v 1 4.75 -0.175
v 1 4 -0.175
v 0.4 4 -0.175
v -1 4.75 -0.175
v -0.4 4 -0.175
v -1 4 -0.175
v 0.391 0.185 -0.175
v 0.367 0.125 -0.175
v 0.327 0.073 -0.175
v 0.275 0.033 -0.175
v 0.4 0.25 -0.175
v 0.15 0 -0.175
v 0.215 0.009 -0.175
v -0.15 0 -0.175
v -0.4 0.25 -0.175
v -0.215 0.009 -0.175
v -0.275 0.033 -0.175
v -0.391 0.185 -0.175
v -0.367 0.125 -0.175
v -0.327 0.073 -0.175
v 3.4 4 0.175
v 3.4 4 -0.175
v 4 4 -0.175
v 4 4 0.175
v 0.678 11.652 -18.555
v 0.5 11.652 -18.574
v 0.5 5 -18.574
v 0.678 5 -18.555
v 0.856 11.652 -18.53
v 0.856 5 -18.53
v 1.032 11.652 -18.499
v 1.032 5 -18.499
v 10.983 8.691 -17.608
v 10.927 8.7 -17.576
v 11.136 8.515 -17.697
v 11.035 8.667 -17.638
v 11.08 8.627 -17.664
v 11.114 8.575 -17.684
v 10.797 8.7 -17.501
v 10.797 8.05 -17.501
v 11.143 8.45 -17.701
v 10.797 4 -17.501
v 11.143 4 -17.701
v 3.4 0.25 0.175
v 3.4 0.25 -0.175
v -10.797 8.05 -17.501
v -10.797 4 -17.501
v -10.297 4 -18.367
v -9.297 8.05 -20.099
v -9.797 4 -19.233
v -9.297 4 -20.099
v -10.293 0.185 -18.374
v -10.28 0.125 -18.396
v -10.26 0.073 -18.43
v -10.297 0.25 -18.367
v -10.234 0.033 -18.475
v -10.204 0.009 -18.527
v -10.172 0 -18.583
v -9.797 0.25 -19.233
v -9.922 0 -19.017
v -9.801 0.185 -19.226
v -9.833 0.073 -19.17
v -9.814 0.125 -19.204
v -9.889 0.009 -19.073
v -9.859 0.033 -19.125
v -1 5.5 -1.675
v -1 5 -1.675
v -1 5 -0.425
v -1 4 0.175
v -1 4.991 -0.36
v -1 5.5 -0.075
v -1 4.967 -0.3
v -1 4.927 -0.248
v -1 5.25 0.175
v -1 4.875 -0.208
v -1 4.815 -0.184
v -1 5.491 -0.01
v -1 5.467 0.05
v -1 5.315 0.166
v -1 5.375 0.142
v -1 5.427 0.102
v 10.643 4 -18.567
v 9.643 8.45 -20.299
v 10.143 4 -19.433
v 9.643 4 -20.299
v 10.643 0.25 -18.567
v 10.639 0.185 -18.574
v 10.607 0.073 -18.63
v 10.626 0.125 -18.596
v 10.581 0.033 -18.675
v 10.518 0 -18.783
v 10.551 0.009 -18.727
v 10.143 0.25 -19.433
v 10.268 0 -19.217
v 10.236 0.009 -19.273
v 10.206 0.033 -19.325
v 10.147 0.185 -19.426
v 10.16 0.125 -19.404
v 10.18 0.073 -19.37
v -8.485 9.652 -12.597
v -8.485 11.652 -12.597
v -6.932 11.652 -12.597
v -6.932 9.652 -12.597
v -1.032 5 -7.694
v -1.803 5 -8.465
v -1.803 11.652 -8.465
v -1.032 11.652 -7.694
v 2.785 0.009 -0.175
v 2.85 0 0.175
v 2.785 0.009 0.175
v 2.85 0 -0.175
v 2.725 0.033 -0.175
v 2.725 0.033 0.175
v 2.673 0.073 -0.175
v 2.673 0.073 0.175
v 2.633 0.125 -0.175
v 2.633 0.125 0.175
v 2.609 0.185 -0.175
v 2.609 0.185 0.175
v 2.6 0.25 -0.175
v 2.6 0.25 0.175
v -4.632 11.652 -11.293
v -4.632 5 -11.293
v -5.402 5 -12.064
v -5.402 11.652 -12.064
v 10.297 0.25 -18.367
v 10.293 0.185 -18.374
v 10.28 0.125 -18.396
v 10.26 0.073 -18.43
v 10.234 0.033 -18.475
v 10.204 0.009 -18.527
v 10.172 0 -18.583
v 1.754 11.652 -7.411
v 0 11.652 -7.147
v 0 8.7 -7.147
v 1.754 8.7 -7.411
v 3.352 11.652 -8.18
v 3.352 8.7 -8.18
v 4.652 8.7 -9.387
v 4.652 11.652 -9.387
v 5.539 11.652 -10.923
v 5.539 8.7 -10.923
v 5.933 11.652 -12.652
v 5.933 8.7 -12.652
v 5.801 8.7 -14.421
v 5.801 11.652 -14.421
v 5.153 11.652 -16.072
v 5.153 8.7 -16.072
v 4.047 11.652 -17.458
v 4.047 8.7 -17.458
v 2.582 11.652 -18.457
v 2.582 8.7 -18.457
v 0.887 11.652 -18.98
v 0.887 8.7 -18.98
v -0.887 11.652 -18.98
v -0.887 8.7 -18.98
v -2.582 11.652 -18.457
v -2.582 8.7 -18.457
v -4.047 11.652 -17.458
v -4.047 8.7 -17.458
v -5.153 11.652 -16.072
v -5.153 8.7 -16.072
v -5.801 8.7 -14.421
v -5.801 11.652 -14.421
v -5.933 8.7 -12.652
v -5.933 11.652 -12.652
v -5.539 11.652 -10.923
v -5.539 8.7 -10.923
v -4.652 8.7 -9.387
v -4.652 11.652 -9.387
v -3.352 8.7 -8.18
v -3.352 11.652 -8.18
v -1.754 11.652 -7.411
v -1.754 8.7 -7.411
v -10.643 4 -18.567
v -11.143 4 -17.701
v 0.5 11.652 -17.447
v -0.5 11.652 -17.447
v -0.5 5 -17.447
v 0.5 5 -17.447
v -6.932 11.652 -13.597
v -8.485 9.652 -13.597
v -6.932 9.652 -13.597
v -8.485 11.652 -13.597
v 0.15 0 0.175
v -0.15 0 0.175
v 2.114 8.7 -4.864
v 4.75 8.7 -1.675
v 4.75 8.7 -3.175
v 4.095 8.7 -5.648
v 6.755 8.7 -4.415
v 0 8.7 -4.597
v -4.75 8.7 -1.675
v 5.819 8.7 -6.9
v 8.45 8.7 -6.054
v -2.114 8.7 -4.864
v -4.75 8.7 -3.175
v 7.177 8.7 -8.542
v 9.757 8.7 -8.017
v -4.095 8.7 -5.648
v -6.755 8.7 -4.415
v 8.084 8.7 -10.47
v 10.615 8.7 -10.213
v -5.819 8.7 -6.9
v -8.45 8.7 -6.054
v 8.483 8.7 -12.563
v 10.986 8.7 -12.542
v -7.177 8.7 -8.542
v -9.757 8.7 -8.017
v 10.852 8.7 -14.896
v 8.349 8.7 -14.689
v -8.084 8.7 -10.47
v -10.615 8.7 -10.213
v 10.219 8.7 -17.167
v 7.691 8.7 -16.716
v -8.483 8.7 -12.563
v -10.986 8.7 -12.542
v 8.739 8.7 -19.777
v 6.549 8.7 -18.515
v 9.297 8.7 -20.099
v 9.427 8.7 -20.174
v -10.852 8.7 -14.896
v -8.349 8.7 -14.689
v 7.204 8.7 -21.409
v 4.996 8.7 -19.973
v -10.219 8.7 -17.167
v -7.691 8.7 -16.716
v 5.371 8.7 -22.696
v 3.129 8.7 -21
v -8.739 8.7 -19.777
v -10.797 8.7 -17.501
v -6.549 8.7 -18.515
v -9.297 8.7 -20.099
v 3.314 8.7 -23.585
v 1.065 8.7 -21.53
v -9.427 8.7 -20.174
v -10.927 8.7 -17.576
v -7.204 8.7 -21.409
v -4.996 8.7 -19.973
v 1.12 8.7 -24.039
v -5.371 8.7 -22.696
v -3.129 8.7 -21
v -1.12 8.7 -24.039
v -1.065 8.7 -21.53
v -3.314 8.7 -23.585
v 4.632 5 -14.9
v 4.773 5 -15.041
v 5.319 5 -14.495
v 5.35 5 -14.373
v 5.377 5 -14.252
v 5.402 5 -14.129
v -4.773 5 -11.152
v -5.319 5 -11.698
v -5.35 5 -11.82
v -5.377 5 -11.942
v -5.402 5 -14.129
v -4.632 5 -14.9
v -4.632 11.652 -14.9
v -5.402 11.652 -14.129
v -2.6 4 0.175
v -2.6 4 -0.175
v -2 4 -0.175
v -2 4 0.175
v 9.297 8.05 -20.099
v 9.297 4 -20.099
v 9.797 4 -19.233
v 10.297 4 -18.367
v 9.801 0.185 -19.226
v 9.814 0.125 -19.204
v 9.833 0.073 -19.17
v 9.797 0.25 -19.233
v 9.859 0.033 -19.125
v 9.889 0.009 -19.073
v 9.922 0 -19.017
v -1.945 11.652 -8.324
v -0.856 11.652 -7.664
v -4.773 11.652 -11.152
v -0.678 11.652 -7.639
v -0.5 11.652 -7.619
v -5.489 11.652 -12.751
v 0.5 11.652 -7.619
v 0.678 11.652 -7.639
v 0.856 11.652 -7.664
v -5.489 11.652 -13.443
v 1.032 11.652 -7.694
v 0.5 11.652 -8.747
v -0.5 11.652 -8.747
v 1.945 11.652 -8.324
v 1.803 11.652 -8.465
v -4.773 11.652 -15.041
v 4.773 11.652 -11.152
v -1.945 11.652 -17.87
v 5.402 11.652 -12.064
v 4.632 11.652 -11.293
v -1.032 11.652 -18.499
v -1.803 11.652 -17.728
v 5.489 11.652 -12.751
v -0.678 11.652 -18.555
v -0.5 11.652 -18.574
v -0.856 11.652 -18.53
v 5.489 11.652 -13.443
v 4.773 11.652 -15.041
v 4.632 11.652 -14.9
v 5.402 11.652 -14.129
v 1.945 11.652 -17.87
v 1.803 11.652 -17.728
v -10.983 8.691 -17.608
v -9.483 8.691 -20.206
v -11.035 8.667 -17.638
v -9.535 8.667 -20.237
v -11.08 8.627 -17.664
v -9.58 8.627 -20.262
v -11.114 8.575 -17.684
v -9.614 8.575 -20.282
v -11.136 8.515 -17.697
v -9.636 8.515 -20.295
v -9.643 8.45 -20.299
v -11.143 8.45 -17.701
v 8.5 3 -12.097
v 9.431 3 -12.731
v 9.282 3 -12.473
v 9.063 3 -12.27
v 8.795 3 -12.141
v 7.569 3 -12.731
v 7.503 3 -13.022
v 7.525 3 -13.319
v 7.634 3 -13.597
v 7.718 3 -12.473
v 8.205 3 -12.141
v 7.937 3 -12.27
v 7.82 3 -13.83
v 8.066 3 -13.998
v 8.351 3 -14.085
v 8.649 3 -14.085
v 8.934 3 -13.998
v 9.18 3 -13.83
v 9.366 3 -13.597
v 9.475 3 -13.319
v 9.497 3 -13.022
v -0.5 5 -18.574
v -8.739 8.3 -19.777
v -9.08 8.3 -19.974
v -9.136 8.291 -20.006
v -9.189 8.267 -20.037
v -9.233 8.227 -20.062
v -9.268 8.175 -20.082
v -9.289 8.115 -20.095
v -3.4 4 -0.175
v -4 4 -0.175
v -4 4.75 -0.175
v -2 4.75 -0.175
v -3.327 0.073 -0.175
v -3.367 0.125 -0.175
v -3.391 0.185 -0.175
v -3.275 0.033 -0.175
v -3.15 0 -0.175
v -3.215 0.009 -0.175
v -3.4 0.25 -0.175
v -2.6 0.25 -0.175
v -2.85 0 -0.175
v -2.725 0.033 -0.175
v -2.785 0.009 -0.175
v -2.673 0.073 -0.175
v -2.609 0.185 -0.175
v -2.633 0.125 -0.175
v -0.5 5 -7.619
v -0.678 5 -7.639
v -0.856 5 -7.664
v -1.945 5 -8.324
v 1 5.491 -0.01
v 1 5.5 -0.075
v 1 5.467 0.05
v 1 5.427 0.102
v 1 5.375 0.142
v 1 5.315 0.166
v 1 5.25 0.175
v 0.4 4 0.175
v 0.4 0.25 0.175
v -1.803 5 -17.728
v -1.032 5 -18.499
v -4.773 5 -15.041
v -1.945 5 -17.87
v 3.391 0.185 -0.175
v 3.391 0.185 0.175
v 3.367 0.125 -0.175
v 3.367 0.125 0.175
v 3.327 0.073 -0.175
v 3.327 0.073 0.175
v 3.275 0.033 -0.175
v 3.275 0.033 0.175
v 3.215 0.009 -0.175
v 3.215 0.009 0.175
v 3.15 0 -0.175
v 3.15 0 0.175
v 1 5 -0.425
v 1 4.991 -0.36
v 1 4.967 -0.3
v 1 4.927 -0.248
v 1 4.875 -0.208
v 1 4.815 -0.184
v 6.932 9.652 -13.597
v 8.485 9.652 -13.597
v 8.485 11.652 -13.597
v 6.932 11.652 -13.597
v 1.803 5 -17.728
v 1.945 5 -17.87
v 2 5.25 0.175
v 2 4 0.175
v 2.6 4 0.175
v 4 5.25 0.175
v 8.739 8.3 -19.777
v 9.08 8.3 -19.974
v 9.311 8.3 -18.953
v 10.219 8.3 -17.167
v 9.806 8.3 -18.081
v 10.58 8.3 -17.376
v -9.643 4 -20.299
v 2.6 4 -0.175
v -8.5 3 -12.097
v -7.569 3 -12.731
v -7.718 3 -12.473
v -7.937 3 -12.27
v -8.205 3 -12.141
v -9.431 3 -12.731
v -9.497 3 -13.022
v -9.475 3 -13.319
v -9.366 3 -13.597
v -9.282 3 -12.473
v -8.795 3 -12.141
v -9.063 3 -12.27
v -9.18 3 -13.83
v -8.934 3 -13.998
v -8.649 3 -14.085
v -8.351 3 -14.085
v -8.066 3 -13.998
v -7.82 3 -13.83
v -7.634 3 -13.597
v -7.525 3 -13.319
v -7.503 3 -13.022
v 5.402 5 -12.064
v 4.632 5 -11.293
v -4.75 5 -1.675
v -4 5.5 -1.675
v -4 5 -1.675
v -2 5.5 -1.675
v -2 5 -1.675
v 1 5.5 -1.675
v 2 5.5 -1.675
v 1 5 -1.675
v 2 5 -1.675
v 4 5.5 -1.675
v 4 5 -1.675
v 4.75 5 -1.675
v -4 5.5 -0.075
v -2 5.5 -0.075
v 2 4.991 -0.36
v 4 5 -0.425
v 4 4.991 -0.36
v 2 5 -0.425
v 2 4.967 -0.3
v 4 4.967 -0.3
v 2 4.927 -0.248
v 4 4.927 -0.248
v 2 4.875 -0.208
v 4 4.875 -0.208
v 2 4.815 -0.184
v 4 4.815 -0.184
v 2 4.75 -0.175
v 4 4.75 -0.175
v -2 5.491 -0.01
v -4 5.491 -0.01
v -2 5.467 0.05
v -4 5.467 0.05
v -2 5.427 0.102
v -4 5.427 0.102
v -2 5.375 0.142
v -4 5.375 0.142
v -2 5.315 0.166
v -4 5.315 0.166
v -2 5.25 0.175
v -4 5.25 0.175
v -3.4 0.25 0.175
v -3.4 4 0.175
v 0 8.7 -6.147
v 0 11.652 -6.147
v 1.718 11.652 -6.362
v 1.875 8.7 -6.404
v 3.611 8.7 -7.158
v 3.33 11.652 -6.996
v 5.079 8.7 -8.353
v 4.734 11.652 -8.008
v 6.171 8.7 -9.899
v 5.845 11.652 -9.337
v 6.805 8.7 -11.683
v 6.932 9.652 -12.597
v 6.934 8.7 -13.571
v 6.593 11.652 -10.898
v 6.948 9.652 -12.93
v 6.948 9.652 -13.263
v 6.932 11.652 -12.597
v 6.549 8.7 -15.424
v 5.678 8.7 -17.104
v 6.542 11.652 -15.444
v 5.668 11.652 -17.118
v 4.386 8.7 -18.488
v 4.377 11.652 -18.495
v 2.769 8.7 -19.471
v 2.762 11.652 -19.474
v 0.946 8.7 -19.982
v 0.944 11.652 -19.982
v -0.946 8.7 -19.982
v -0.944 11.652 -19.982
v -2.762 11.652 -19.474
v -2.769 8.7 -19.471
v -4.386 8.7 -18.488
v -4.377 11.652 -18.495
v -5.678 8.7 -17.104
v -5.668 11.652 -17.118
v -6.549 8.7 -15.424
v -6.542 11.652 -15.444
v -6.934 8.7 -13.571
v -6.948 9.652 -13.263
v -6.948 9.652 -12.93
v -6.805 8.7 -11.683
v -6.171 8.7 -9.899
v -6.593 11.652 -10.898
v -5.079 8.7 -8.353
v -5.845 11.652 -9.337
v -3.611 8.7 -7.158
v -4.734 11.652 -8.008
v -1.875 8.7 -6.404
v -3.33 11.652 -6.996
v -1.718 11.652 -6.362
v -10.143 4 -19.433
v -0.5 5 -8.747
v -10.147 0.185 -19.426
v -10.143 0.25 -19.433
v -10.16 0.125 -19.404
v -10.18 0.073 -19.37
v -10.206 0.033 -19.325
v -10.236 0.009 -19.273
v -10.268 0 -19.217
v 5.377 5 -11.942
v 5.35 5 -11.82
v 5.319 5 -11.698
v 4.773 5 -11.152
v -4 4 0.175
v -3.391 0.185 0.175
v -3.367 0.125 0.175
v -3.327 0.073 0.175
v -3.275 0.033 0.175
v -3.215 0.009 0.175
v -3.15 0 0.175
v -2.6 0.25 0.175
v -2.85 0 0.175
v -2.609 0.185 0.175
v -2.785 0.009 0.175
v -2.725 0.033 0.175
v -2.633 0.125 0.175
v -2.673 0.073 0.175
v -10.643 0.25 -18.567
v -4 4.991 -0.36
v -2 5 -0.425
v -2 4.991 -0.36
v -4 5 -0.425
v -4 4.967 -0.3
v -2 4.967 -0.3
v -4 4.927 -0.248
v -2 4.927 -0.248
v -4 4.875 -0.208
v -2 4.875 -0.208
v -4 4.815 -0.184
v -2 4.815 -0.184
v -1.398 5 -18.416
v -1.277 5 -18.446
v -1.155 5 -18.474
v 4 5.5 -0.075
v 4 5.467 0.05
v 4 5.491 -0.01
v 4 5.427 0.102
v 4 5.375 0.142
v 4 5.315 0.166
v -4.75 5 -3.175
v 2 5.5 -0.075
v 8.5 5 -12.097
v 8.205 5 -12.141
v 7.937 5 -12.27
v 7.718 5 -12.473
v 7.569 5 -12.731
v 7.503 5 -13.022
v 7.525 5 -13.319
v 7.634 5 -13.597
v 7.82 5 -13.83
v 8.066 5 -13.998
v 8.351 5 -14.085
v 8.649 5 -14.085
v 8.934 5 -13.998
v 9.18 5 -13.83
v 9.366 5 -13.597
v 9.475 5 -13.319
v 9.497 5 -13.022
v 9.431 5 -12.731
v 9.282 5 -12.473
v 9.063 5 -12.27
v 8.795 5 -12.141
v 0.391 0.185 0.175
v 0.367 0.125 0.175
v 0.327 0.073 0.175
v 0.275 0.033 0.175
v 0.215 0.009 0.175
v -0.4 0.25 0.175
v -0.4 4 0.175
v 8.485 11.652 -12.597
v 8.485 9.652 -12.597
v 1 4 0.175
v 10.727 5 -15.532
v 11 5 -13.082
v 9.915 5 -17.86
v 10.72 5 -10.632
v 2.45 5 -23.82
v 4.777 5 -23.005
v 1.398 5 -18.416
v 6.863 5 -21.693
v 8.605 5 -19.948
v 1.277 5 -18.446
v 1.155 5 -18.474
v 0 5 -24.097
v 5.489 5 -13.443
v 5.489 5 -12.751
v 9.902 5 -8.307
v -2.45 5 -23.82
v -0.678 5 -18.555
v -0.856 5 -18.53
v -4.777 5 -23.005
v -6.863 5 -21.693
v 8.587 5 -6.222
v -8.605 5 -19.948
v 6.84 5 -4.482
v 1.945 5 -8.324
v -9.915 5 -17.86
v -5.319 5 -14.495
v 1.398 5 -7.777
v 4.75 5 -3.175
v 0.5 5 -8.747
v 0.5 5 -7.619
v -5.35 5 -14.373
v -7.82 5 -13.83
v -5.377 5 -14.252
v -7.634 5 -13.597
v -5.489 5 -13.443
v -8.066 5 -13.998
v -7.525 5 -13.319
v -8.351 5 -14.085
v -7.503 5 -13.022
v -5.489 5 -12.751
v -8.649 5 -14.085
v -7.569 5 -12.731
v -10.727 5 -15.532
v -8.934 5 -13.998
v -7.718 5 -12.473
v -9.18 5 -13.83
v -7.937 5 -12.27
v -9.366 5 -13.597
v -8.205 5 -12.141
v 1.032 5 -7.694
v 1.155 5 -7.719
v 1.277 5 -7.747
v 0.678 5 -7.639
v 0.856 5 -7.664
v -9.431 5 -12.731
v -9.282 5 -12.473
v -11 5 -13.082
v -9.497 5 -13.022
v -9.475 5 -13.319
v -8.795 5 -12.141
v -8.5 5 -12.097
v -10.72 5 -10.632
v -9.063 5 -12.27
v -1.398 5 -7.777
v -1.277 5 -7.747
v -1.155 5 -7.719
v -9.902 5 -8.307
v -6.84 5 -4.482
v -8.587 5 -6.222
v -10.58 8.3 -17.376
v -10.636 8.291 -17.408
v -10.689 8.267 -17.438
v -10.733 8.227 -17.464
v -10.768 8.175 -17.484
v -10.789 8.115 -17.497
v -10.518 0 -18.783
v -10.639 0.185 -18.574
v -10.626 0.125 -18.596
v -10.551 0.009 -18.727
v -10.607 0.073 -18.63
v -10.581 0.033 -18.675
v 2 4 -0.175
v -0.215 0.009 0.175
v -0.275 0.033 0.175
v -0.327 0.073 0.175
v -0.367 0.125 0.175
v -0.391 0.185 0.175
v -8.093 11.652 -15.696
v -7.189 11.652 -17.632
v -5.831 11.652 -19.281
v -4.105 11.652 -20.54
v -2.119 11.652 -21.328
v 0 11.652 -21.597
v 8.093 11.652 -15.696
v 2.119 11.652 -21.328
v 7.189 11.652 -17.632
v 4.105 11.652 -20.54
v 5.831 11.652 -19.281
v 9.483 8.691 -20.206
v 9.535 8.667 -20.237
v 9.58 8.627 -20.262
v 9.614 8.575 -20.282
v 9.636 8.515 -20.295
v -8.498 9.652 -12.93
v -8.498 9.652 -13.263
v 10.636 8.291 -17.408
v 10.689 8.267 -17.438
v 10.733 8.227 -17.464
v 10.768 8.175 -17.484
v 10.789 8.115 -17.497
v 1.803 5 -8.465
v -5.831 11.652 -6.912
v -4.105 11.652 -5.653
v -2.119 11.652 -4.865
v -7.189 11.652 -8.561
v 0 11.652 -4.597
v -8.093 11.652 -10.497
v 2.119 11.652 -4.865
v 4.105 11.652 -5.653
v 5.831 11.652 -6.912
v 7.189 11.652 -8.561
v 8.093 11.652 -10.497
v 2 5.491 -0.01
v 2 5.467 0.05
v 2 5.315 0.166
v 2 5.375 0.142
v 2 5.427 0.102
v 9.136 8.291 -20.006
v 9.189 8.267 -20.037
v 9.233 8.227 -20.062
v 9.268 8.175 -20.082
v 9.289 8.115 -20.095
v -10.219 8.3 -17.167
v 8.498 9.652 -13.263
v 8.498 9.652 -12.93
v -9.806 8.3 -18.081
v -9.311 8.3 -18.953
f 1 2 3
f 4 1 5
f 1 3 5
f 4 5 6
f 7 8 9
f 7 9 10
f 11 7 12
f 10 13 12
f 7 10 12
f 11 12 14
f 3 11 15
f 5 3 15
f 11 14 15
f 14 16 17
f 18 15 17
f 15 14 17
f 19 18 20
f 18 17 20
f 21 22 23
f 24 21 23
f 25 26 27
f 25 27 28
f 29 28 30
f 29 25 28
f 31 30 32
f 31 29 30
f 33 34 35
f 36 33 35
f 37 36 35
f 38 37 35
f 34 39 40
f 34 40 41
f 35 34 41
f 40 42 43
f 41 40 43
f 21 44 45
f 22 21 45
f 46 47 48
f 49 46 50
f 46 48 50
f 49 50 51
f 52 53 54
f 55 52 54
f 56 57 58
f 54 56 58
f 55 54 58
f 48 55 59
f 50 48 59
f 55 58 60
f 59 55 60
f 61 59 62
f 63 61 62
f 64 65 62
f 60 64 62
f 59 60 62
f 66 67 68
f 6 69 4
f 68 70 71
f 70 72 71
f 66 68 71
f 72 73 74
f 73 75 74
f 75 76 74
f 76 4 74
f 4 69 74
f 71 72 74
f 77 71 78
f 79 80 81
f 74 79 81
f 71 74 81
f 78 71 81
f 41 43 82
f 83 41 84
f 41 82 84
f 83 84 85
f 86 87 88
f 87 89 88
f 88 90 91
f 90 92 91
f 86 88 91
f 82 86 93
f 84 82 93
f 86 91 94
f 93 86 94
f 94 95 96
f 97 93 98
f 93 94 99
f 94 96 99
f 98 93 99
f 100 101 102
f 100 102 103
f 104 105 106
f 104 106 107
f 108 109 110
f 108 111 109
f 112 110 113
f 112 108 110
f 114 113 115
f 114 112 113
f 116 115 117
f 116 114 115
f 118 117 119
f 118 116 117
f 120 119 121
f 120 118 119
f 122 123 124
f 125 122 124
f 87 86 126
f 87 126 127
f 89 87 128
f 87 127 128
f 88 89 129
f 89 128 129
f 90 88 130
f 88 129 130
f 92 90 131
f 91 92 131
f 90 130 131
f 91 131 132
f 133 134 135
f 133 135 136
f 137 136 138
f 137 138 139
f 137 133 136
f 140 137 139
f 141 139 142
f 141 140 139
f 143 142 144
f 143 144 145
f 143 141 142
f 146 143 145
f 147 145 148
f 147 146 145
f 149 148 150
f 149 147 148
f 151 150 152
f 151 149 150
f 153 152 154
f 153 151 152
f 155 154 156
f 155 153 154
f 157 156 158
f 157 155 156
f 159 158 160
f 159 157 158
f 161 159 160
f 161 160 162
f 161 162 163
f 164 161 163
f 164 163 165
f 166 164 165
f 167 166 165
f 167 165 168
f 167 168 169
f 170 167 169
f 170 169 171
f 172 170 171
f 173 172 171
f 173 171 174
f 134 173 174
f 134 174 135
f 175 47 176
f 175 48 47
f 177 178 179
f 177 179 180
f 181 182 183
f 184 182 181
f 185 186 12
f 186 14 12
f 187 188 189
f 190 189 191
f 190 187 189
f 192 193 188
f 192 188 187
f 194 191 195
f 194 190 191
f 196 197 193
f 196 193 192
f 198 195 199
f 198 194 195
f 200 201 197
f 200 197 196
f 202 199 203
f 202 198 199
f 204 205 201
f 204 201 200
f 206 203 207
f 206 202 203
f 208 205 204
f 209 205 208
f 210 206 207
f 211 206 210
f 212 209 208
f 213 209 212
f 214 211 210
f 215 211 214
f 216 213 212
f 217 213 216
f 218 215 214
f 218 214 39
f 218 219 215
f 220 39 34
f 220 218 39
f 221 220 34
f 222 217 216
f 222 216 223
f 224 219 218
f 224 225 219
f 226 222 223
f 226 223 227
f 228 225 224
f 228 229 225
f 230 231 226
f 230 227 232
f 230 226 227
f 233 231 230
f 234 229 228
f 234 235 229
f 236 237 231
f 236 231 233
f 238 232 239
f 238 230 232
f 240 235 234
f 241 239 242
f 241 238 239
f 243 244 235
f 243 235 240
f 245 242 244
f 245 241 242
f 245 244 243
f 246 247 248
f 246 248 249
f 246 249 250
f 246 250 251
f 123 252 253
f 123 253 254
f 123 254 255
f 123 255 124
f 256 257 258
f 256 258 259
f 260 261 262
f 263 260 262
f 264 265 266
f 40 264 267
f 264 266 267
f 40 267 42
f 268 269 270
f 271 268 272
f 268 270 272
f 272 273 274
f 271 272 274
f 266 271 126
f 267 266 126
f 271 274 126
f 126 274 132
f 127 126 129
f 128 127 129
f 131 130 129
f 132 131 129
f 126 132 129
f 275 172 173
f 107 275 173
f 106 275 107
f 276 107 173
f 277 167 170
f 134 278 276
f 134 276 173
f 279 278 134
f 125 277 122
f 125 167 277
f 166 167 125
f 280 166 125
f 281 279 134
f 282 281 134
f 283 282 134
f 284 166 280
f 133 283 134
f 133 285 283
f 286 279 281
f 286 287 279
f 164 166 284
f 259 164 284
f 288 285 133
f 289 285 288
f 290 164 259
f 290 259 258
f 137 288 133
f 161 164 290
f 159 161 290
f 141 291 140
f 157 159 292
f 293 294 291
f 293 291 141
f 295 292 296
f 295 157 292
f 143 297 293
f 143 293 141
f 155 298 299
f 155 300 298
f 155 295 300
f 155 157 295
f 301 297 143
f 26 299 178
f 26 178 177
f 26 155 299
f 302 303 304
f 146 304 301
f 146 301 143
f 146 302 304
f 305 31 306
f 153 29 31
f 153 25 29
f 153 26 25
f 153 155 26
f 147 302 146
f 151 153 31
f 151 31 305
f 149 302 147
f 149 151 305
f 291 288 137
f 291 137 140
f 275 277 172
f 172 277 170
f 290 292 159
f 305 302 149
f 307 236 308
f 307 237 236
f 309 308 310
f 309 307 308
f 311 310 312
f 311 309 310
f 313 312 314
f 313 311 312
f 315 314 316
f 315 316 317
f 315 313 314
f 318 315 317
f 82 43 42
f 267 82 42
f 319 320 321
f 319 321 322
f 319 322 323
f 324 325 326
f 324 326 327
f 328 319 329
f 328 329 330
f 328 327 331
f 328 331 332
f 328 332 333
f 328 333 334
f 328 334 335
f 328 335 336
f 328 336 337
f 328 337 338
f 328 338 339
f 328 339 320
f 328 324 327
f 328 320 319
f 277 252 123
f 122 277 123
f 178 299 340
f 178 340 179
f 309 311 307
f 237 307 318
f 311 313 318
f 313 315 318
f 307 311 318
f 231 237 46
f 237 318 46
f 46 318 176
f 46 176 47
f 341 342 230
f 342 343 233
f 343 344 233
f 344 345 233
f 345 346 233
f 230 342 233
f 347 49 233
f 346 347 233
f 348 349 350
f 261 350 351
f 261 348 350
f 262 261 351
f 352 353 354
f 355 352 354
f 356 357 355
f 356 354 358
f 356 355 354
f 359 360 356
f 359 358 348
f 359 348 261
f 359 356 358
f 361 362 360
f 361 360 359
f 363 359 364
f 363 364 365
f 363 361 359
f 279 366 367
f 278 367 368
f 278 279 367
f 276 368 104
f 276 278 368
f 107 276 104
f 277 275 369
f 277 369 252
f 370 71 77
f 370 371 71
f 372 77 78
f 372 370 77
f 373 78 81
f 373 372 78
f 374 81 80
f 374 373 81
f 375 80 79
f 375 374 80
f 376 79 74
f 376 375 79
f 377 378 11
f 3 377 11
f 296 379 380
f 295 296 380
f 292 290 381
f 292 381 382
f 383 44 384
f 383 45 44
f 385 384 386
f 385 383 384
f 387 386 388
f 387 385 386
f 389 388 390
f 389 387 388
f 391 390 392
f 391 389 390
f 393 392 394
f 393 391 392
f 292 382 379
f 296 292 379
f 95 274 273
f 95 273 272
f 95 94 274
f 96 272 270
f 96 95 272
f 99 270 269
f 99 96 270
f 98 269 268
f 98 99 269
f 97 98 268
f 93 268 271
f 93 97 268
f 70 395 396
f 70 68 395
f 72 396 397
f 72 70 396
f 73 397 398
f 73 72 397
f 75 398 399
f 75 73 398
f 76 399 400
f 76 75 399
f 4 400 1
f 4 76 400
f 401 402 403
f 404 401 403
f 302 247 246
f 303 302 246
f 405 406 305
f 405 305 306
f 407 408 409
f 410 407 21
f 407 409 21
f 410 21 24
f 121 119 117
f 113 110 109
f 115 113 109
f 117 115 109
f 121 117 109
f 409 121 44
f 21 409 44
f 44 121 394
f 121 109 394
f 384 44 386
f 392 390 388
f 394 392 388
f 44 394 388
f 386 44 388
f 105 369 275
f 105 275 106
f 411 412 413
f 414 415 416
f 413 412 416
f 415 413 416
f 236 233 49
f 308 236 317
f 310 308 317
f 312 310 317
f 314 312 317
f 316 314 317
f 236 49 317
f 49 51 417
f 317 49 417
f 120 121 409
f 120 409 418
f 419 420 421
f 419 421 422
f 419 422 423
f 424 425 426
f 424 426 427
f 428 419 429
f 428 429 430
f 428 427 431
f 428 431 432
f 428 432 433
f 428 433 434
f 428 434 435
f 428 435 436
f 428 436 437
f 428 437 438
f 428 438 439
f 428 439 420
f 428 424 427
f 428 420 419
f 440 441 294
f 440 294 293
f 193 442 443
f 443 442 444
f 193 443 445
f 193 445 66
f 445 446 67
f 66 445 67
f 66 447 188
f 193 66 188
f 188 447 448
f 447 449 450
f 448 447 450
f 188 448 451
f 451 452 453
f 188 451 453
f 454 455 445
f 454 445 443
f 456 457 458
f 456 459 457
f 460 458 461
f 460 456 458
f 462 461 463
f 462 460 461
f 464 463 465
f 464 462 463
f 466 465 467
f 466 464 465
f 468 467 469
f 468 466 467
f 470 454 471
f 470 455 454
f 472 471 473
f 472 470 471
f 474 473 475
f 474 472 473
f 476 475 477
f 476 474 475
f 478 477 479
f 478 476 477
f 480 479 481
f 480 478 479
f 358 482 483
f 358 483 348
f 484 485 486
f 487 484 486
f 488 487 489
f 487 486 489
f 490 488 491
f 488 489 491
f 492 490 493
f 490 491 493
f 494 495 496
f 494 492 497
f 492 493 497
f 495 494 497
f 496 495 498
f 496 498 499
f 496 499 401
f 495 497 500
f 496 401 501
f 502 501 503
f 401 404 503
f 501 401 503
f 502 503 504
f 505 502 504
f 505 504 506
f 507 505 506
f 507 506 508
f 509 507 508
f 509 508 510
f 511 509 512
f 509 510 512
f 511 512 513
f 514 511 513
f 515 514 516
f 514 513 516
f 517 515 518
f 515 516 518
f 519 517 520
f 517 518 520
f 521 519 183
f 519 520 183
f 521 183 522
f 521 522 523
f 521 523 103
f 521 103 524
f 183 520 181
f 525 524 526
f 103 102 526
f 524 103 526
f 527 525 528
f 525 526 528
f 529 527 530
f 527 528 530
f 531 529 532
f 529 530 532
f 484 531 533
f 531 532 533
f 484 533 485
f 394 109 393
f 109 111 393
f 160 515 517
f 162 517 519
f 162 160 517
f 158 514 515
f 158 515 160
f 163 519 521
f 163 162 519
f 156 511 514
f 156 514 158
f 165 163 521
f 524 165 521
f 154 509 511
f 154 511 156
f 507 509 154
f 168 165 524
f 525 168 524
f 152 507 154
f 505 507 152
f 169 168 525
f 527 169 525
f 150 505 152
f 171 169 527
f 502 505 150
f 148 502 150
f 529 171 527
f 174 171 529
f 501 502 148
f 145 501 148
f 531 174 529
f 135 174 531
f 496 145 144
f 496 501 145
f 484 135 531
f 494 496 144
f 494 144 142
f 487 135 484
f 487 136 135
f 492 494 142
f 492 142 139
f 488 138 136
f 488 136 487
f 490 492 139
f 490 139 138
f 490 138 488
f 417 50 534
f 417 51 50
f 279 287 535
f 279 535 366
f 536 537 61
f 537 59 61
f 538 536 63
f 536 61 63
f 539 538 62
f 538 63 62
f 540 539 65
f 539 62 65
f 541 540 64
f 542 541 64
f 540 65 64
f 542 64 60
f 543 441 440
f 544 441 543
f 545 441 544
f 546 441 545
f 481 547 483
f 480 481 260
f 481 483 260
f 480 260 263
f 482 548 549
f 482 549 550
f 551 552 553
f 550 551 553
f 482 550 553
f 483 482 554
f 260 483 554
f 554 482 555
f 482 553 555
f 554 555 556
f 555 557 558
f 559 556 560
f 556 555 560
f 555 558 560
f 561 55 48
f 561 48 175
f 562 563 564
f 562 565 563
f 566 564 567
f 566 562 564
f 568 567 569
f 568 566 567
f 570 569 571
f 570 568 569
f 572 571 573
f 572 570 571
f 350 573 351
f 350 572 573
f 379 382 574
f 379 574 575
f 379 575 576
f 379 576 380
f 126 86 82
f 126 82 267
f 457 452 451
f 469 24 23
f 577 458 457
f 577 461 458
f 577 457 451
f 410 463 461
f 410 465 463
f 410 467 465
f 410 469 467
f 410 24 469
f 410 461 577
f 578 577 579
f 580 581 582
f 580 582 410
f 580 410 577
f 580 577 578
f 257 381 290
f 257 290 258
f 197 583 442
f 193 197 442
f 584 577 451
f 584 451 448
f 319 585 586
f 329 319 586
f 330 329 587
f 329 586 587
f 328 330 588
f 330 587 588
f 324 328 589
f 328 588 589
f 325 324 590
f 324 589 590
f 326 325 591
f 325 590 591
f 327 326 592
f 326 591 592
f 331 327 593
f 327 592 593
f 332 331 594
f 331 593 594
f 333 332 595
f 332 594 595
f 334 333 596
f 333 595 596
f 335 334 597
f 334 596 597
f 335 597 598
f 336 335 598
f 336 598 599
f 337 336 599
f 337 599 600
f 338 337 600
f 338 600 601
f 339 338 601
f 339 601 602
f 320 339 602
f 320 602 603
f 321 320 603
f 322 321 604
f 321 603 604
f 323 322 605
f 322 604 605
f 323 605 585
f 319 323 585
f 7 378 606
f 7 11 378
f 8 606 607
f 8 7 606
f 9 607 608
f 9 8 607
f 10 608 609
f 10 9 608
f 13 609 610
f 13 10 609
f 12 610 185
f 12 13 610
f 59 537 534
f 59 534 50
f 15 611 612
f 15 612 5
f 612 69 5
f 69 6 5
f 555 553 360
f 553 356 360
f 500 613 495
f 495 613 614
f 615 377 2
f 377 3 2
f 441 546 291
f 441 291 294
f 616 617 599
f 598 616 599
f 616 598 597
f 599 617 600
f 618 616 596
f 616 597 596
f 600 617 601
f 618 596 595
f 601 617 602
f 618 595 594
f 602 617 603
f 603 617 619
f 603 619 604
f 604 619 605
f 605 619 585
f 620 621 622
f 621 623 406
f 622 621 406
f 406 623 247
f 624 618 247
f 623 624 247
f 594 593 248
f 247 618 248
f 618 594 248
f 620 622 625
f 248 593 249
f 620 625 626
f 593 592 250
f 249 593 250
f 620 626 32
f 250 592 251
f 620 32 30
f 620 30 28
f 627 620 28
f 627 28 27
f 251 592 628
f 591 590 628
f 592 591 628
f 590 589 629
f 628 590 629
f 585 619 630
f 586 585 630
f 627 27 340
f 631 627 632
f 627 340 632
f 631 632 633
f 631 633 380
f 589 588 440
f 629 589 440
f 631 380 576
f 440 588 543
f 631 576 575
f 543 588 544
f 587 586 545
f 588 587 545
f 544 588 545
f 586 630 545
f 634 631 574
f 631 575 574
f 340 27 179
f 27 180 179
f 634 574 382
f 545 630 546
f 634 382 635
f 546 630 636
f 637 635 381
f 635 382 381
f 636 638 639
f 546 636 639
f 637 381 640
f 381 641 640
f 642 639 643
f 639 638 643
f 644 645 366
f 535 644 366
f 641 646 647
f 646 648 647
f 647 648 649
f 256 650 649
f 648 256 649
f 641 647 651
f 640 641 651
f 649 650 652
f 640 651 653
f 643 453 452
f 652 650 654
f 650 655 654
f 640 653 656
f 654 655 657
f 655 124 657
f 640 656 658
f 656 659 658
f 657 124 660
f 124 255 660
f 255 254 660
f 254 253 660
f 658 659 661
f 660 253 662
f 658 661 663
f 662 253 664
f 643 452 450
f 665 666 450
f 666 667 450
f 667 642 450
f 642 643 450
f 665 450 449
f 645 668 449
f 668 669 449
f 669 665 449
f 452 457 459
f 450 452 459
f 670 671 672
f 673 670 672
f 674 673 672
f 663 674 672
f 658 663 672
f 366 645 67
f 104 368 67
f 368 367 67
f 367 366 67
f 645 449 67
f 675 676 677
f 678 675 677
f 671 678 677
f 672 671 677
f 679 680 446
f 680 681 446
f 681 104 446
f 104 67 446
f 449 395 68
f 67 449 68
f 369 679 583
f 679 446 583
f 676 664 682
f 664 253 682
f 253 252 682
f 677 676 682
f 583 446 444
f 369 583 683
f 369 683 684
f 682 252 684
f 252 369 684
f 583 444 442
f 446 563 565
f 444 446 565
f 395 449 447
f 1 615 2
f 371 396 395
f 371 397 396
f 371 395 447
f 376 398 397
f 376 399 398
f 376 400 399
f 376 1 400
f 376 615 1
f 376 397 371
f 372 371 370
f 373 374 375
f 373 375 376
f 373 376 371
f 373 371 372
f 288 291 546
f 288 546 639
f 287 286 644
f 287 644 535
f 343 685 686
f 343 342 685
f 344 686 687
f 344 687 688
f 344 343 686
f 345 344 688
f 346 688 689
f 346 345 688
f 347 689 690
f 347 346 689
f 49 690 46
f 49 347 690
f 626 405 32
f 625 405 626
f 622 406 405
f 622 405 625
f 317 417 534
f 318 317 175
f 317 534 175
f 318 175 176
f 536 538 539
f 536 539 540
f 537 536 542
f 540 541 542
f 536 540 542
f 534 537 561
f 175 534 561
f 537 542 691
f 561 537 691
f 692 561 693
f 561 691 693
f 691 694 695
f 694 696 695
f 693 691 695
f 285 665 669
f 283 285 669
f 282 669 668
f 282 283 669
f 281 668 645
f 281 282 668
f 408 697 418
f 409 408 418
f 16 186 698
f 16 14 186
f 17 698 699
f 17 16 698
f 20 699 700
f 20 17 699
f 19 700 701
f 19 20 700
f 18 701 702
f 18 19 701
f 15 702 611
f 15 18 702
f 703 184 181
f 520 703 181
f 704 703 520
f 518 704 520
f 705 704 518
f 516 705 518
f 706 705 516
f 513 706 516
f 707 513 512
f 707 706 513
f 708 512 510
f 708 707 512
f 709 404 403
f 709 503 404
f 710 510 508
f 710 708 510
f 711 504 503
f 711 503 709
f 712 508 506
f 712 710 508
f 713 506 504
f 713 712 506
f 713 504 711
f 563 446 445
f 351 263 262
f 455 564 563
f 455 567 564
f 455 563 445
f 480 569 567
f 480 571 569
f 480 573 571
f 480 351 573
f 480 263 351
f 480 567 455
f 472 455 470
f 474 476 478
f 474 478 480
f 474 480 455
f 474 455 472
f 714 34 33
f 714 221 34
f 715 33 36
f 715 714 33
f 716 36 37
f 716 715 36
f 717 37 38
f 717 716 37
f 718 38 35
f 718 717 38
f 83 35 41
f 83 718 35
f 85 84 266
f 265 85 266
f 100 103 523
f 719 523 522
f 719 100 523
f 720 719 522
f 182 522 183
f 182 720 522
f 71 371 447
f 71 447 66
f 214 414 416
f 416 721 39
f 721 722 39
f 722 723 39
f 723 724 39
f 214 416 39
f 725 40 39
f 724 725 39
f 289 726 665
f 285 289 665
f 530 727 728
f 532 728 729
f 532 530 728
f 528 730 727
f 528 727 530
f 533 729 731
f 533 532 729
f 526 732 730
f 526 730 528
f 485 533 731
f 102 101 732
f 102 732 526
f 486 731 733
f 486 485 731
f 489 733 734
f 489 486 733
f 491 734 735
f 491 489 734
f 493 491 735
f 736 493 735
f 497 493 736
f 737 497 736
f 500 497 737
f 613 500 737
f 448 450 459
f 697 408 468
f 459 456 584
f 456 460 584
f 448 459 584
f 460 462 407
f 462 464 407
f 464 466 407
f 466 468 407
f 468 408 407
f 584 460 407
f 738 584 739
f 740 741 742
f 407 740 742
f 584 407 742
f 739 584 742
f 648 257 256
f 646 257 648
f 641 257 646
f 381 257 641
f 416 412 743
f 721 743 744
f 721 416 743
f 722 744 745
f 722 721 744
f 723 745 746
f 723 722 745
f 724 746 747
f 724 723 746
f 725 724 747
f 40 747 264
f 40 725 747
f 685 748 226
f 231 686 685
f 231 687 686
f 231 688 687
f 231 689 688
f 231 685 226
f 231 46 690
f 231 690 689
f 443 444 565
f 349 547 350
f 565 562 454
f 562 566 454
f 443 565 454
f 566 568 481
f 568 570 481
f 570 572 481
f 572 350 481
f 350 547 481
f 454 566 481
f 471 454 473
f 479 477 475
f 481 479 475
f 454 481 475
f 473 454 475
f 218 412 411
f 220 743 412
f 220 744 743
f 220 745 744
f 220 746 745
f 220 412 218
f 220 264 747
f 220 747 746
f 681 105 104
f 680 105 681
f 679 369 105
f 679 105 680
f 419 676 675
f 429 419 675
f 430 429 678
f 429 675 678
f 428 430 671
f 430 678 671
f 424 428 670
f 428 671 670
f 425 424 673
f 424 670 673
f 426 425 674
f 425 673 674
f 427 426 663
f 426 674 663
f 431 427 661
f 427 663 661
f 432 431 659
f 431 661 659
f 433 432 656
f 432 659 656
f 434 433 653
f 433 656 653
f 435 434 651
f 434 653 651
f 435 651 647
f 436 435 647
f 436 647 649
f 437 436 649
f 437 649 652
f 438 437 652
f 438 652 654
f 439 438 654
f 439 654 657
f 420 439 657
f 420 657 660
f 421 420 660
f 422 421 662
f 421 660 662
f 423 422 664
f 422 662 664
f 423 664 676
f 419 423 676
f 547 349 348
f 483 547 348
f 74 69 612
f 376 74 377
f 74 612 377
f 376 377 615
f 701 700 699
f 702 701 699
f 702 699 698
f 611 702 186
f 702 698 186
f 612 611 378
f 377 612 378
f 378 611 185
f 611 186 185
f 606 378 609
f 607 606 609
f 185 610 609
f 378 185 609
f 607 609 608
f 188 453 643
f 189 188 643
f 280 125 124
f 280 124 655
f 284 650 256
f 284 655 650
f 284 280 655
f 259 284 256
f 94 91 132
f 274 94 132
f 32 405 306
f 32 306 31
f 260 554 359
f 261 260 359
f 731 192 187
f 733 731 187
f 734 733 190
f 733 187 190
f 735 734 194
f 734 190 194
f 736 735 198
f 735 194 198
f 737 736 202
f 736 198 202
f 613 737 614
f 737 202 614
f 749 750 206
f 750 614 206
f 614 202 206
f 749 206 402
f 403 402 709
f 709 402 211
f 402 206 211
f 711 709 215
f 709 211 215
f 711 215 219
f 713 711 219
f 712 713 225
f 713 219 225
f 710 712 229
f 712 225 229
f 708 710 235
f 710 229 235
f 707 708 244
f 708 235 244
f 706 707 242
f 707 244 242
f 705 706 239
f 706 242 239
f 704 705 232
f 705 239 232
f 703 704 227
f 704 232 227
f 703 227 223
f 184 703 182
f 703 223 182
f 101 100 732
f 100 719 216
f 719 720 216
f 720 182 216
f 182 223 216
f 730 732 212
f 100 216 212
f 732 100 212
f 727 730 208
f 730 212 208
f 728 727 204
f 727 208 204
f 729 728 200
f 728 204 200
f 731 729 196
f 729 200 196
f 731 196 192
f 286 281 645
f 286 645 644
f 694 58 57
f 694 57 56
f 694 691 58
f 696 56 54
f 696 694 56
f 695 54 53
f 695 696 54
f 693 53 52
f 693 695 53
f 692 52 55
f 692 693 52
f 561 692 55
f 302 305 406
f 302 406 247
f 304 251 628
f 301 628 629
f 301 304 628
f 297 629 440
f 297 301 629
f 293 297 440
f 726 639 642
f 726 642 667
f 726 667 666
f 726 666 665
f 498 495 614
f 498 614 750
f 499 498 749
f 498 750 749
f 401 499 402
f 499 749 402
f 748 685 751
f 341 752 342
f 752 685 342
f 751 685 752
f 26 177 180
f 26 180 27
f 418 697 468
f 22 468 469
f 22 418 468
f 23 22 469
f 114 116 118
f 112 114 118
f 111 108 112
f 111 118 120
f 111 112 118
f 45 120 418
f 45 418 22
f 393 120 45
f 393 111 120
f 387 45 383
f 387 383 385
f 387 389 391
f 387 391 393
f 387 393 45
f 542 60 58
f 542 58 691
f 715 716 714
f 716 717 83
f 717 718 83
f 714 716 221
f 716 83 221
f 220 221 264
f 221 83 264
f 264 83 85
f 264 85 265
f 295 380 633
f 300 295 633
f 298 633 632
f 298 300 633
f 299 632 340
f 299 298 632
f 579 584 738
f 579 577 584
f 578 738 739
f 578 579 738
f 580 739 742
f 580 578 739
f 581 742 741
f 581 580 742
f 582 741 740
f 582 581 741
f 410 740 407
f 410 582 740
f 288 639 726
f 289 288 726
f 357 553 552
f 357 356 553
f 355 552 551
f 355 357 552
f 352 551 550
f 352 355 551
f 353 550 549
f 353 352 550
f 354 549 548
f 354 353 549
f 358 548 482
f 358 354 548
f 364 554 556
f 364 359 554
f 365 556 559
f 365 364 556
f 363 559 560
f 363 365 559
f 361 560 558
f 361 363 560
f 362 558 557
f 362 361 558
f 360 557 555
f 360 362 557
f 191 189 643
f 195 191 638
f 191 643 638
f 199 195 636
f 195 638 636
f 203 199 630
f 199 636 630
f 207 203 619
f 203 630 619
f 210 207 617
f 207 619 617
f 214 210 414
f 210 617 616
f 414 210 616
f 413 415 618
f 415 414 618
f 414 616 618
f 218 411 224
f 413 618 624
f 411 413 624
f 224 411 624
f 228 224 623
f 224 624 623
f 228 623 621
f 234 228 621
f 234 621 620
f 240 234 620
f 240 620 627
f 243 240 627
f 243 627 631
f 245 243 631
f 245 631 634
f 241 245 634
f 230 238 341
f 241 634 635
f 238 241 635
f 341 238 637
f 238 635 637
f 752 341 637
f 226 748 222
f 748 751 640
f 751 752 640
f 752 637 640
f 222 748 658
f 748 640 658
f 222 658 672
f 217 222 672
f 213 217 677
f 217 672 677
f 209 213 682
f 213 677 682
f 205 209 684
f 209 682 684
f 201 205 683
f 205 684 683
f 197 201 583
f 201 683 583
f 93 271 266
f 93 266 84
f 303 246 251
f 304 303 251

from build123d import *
from build123d.topology import SkipClean

# Parameters (mm, degrees)
BOSS_EXTRUDE1_DEPTH      = 4
SKETCH1_W                = 0.8
SKETCH1_H                = 0.35
BOSS_EXTRUDE1_2_DEPTH    = 4
BOSS_EXTRUDE1_3_DEPTH    = 4
BOSS_EXTRUDE1_4_DEPTH    = 4
BOSS_EXTRUDE1_5_DEPTH    = 4
SKETCH2_W                = 0.6
SKETCH2_H                = 0.35
SKETCH2_W_2              = 0.8
SKETCH2_W_3              = 2
BOSS_EXTRUDE2_DEPTH      = 1.5
SKETCH3_W                = 2
SKETCH3_H                = 0.5
BOSS_EXTRUDE3_DEPTH      = 1.5
BOSS_EXTRUDE4_DEPTH      = 3.7
BOSS_EXTRUDE6_DEPTH      = 3.2
BOSS_EXTRUDE7_REACH      = 33.958
BOSS_EXTRUDE7_END_RADIUS = 11
SKETCH7_W                = 3
SKETCH7_H                = 0.4
BOSS_EXTRUDE8_REACH      = 33.958
SKETCH8_W                = 3
SKETCH8_H                = 0.4
SKETCH9_R                = 1
BOSS_EXTRUDE9_DEPTH      = 2
SKETCH5_R                = 8.5
BOSS_EXTRUDE5_DEPTH      = 4.952033783
FILLET1_R                = 0.25
FILLET2_R                = 0.25
SKETCH10_R               = 5.5
CUT_EXTRUDE1_DEPTH       = 2
CUT_EXTRUDE2_DEPTH       = 29.992852085
BOSS_EXTRUDE10_START     = -8.652034
BOSS_EXTRUDE10_DEPTH     = 8.652034
CIRPATTERN2_COUNT        = 4
SKETCH13_R               = 6.95
SKETCH13_R_2             = 5.95
CUT_EXTRUDE3_DEPTH       = 4.952033783
CHAMFER1_SIZE            = 1
CUT_EXTRUDE4_REACH       = 35.954
CUT_EXTRUDE4_END_RADIUS  = 6.95
CUT_EXTRUDE5_START       = -17
CUT_EXTRUDE5_DEPTH       = 2.01521
CUT_EXTRUDE6_START       = -2.000004
SKETCH16_R               = 8.5
CUT_EXTRUDE6_DEPTH       = 2.000004


with BuildPart() as part:
    # Sketch1 → Boss-Extrude1 (new body)
    with BuildSketch(Plane(origin=(0, 0, 0), x_dir=(1, 0, 0), z_dir=(0, 1, 0))):
        Polygon((9.796794919, 19.233012702), (10.143205081, 19.433012702), (10.643205081, 18.566987298), (10.296794919, 18.366987298), align=None)
    extrude(amount=BOSS_EXTRUDE1_DEPTH)



with BuildPart() as body_2:
    # Sketch1 → Boss-Extrude1 2 (new body)
    with BuildSketch(Plane(origin=(0, 0, 0), x_dir=(1, 0, 0), z_dir=(0, 1, 0))):
        with Locations((-3, 0)):
            Rectangle(SKETCH1_W, SKETCH1_H)
    extrude(amount=BOSS_EXTRUDE1_2_DEPTH)


with BuildPart() as body_3:
    # Sketch1 → Boss-Extrude1 3 (new body)
    with BuildSketch(Plane(origin=(0, 0, 0), x_dir=(1, 0, 0), z_dir=(0, 1, 0))):
        Rectangle(SKETCH1_W, SKETCH1_H)
    extrude(amount=BOSS_EXTRUDE1_3_DEPTH)


with BuildPart() as body_4:
    # Sketch1 → Boss-Extrude1 4 (new body)
    with BuildSketch(Plane(origin=(0, 0, 0), x_dir=(1, 0, 0), z_dir=(0, 1, 0))):
        with Locations((3, 0)):
            Rectangle(SKETCH1_W, SKETCH1_H)
    extrude(amount=BOSS_EXTRUDE1_4_DEPTH)


with BuildPart() as body_5:
    # Sketch1 → Boss-Extrude1 5 (new body)
    with BuildSketch(Plane(origin=(0, 0, 0), x_dir=(1, 0, 0), z_dir=(0, 1, 0))):
        Polygon((-10.296794919, 18.366987298), (-10.643205081, 18.566987298), (-10.143205081, 19.433012702), (-9.796794919, 19.233012702), align=None)
    extrude(amount=BOSS_EXTRUDE1_5_DEPTH)


with BuildPart() as part_1:
    add(part.part)

    add(body_2.part)  # Boss-Extrude2 merges body 2

    add(body_3.part)  # Boss-Extrude2 merges body 3

    add(body_4.part)  # Boss-Extrude2 merges body 4

    add(body_5.part)  # Boss-Extrude2 merges body 5
    # Sketch2 → Boss-Extrude2 (add)
    with BuildSketch(Plane(origin=(0, 4, 0), x_dir=(1, 0, 0), z_dir=(0, 1, 0))):
        Polygon((-11.143205081, 17.700961894), (-9.643205081, 20.299038106), (-9.296794919, 20.099038106), (-10.796794919, 17.500961894), align=None)
        Polygon((9.643205081, 20.299038106), (11.143205081, 17.700961894), (10.796794919, 17.500961894), (9.296794919, 20.099038106), align=None)
        with Locations((0.7, 0)):
            Rectangle(SKETCH2_W, SKETCH2_H)
        Rectangle(SKETCH2_W_2, SKETCH2_H)
        with Locations((-0.7, 0)):
            Rectangle(SKETCH2_W, SKETCH2_H)
        with Locations((-3, 0)):
            Rectangle(SKETCH2_W_3, SKETCH2_H)
        with Locations((3, 0)):
            Rectangle(SKETCH2_W_3, SKETCH2_H)
    extrude(amount=BOSS_EXTRUDE2_DEPTH)

    # Sketch3 → Boss-Extrude3 (add)
    with BuildSketch(Plane(origin=(0, 0, -0.175), x_dir=(-1, 0, 0), z_dir=(0, 0, -1))):
        with Locations((-3, 5.25)):
            Rectangle(SKETCH3_W, SKETCH3_H)
        with Locations((0, 5.25)):
            Rectangle(SKETCH3_W, SKETCH3_H)
        with Locations((3, 5.25)):
            Rectangle(SKETCH3_W, SKETCH3_H)
    extrude(amount=BOSS_EXTRUDE3_DEPTH)

    # Sketch4 → Boss-Extrude4 (add)
    with BuildSketch(Plane.XZ.offset(-5)):
        with BuildLine():
            Line((-4.75, -1.675), (4.75, -1.675))
            Line((4.75, -1.675), (4.75, -3.175))
            ThreePointArc((4.75, -3.175), (0, -24.096567416), (-4.75, -3.175))
            Line((-4.75, -3.175), (-4.75, -1.675))
        make_face()
    extrude(amount=-BOSS_EXTRUDE4_DEPTH)

    # Sketch6 → Boss-Extrude6 (add)
    with BuildSketch(Plane(origin=(0, 5.5, 0), x_dir=(1, 0, 0), z_dir=(0, 1, 0))):
        Polygon((-9.643205081, 20.299038106), (-11.143205081, 17.700961894), (-10.796794919, 17.500961894), (-9.296794919, 20.099038106), align=None)
        Polygon((11.143205081, 17.700961894), (9.643205081, 20.299038106), (9.296794919, 20.099038106), (10.796794919, 17.500961894), align=None)
    extrude(amount=BOSS_EXTRUDE6_DEPTH)

    # Boss-Extrude7: up to this cylinder (the profile starts outside it)
    boss_extrude7_end = Plane(origin=(0, 8.5, -13.096567416), z_dir=(0, -1, 0)) * Cylinder(BOSS_EXTRUDE7_END_RADIUS, 90.916, mode=Mode.PRIVATE)
    # Sketch7 → Boss-Extrude7 (add, up to the surface)
    with BuildSketch(Plane(origin=(15.675734985, 0, -9.050389813), x_dir=(0.4999999999999947, 0, 0.8660254037844417), z_dir=(-0.8660254037844418, 0, 0.49999999999999484)), mode=Mode.PRIVATE) as boss_extrude7_sk1:
        with Locations((-11.257880132, 8.5)):
            Rectangle(SKETCH7_W, SKETCH7_H)
    boss_extrude7_tool1 = extrude(boss_extrude7_sk1.sketch, amount=BOSS_EXTRUDE7_REACH, mode=Mode.PRIVATE) - boss_extrude7_end
    add(boss_extrude7_tool1.solids().sort_by_distance((10.046795, 8.5, -18.8))[0])

    # Sketch8 → Boss-Extrude8 (add, up to next)
    with BuildSketch(Plane(origin=(-15.675734985, 0, -9.050389813), x_dir=(0.4999999999999956, 0, -0.8660254037844413), z_dir=(0.8660254037844413, 0, 0.4999999999999956)), mode=Mode.PRIVATE) as boss_extrude8_sk1:
        with Locations((11.257880132, 8.5)):
            Rectangle(SKETCH8_W, SKETCH8_H)
    boss_extrude8_tool1 = extrude(boss_extrude8_sk1.sketch, amount=BOSS_EXTRUDE8_REACH, mode=Mode.PRIVATE) - part_1.part
    add(boss_extrude8_tool1.solids().sort_by_distance((-10.046795, 8.5, -18.8))[0])

    # Sketch9 → Boss-Extrude9 (add)
    with BuildSketch(Plane.XZ.offset(-5)):
        with Locations(Location((-8.5, -13.096567416, 0), (0, 0, 90))):
            Circle(SKETCH9_R)
        with Locations(Location((8.5, -13.096567416, 0), (0, 0, 90))):
            Circle(SKETCH9_R)
    extrude(amount=BOSS_EXTRUDE9_DEPTH)

    # Sketch5 → Boss-Extrude5 (add)
    with BuildSketch(Plane(origin=(0, 8.7, 0), x_dir=(1, 0, 0), z_dir=(0, 1, 0))):
        with Locations(Location((0, 13.096567416, 0), (0, 0, 270))):
            Circle(SKETCH5_R)
    extrude(amount=BOSS_EXTRUDE5_DEPTH)

    # Fillet1
    fillet1_edges = [part_1.edges().sort_by_distance(p)[0] for p in [
        (-10.393205081, 8.7, -19),
        (-10.046794919, 8.3, -18.8),
        (-3, 5.5, 0.175),
        (-3, 5, -0.175),
        (3, 5, -0.175),
        (0, 5, -0.175),
        (0, 5.5, 0.175),
        (3, 5.5, 0.175),
        (10.046794919, 8.3, -18.8),
        (10.393205081, 8.7, -19),
    ]]
    fillet(fillet1_edges, radius=FILLET1_R)

    # Fillet2
    fillet2_edges = [part_1.edges().sort_by_distance(p)[0] for p in [
        (-3.4, 0, 0),
        (-2.6, 0, 0),
        (-10.47, 0, -18.466987298),
        (-0.4, 0, 0),
        (0.4, 0, 0),
        (2.6, 0, 0),
        (3.4, 0, 0),
        (-9.97, 0, -19.333012702),
        (10.47, 0, -18.466987298),
        (9.97, 0, -19.333012702),
    ]]
    fillet(fillet2_edges, radius=FILLET2_R)

    # Sketch10 → Cut-Extrude1 (cut)
    with BuildSketch(Plane(origin=(0, 13.652033783, 0), x_dir=(1, 0, 0), z_dir=(0, 1, 0))):
        with Locations(Location((0, 13.096567416, 0), (0, 0, 270))):
            Circle(SKETCH10_R)
    extrude(amount=-CUT_EXTRUDE1_DEPTH, mode=Mode.SUBTRACT)

    # Sketch11 → Cut-Extrude2 (cut, through all)
    with BuildSketch(Plane(origin=(0, 11.652033783, 0), x_dir=(1, 0, 0), z_dir=(0, 1, 0))):
        with BuildLine():
            Line((-5.319305603, 14.494776234), (-1.398208818, 18.41587302))
            ThreePointArc((-1.398208818, 18.41587302), (-0.952383252, 18.513482234), (-0.5, 18.573792992))
            Line((-0.5, 18.573792992), (-0.5, 17.446567416))
            Line((-0.5, 17.446567416), (0.5, 17.446567416))
            Line((0.5, 17.446567416), (0.5, 18.573792992))
            ThreePointArc((0.5, 18.573792992), (0.952383252, 18.513482234), (1.398208818, 18.41587302))
            Line((1.398208818, 18.41587302), (5.319305603, 14.494776234))
            ThreePointArc((5.319305603, 14.494776234), (5.5, 13.096567416), (5.319305603, 11.698358599))
            Line((5.319305603, 11.698358599), (1.398208818, 7.777261813))
            ThreePointArc((1.398208818, 7.777261813), (0.952383252, 7.679652599), (0.5, 7.619341841))
            Line((0.5, 7.619341841), (0.5, 8.746567416))
            Line((0.5, 8.746567416), (-0.5, 8.746567416))
            Line((-0.5, 8.746567416), (-0.5, 7.619341841))
            ThreePointArc((-0.5, 7.619341841), (-0.952383252, 7.679652599), (-1.398208818, 7.777261813))
            Line((-1.398208818, 7.777261813), (-5.319305603, 11.698358599))
            ThreePointArc((-5.319305603, 11.698358599), (-5.5, 13.096567416), (-5.319305603, 14.494776234))
        make_face()
    extrude(amount=-CUT_EXTRUDE2_DEPTH, mode=Mode.SUBTRACT)

    # Sketch12 → Boss-Extrude10 (add)
    with BuildSketch(Plane(origin=(0, 13.652033783, 0), x_dir=(1, 0, 0), z_dir=(0, 1, 0)).offset(BOSS_EXTRUDE10_START)):
        with BuildLine():
            Line((-2.208630624, 18.133625165), (-1.803122292, 17.728116833))
            Line((-1.803122292, 17.728116833), (-1.032444553, 18.498794573))
            ThreePointArc((-1.032444553, 18.498794573), (-1.630790989, 18.349235381), (-2.208630624, 18.133625165))
        make_face()
        with BuildLine():
            Line((-5.037057749, 15.305198041), (-4.631549417, 14.899689709))
            Line((-4.631549417, 14.899689709), (-5.402227156, 14.129011969))
            ThreePointArc((-5.402227156, 14.129011969), (-5.252667965, 14.727358405), (-5.037057749, 15.305198041))
        make_face()
    boss_extrude10 = extrude(amount=BOSS_EXTRUDE10_DEPTH)

    # CirPattern2: Boss-Extrude10 ×4 about axis
    cirpattern2_axis = Axis((0, 0, -13.096567416), (0, 1, 0))
    for i in range(1, CIRPATTERN2_COUNT):
        add(boss_extrude10.rotate(cirpattern2_axis, i * 360 / CIRPATTERN2_COUNT))

    # Sketch13 → Cut-Extrude3 (cut)
    with SkipClean():  # the faces are left unmerged after this step: merging them gives an invalid solid
        with BuildSketch(Plane(origin=(0, 13.652033783, 0), x_dir=(1, 0, 0), z_dir=(0, 1, 0))):
            with Locations(Location((0, 13.096567416, 0), (0, 0, 270))):
                Circle(SKETCH13_R)
            with Locations(Location((0, 13.096567416, 0), (0, 0, 270))):
                Circle(SKETCH13_R_2, mode=Mode.SUBTRACT)
        extrude(amount=-CUT_EXTRUDE3_DEPTH, mode=Mode.SUBTRACT)

    # Chamfer1
    chamfer1_edges = [part_1.edges().sort_by_distance(p)[0] for p in [
        (0, 13.652033783, -21.596567416),
    ]]
    chamfer(chamfer1_edges, length=CHAMFER1_SIZE)

    # Cut-Extrude4: up to this cylinder (the profile starts outside it)
    with SkipClean():  # the faces are left unmerged after this step: merging them gives an invalid solid
        cut_extrude4_end = Plane(origin=(0, 12.3187, -13.096567416), z_dir=(0, 1, 0)) * Cylinder(CUT_EXTRUDE4_END_RADIUS, 86.808, mode=Mode.PRIVATE)
        # Sketch14 → Cut-Extrude4 (cut, up to the surface)
        with BuildSketch(Plane(origin=(8.5, 0, 0), x_dir=(0, 0, -1), z_dir=(1, 0, 0)), mode=Mode.PRIVATE) as cut_extrude4_sk1:
            Polygon((10.596567416, 13.652033783), (12.596567416, 11.652033783), (12.596567416, 9.652033783), (13.596567416, 9.652033783), (13.596567416, 11.652033783), (15.596567416, 13.652033783), align=None)
        cut_extrude4_tool1 = extrude(cut_extrude4_sk1.sketch, amount=-CUT_EXTRUDE4_REACH, mode=Mode.PRIVATE) - cut_extrude4_end
        add(cut_extrude4_tool1.solids().sort_by_distance((8.5, 12.3187, -13.096567))[0], mode=Mode.SUBTRACT)

    # Sketch14<2> → Cut-Extrude5 (cut)
    with SkipClean():  # the faces are left unmerged after this step: merging them gives an invalid solid
        with BuildSketch(Plane(origin=(8.5, 0, 0), x_dir=(0, 0, -1), z_dir=(1, 0, 0)).offset(CUT_EXTRUDE5_START)):
            Polygon((10.596567416, 13.652033783), (12.596567416, 11.652033783), (12.596567416, 9.652033783), (13.596567416, 9.652033783), (13.596567416, 11.652033783), (15.596567416, 13.652033783), align=None)
        extrude(amount=CUT_EXTRUDE5_DEPTH, mode=Mode.SUBTRACT)

    # Sketch16 → Cut-Extrude6 (cut)
    with BuildSketch(Plane(origin=(0, 13.652033783, 0), x_dir=(1, 0, 0), z_dir=(0, 1, 0)).offset(CUT_EXTRUDE6_START)):
        with Locations(Location((0, 13.096567416, 0), (0, 0, 3.372286684))):
            Circle(SKETCH16_R)
    extrude(amount=CUT_EXTRUDE6_DEPTH, mode=Mode.SUBTRACT)


solid = part_1.part
